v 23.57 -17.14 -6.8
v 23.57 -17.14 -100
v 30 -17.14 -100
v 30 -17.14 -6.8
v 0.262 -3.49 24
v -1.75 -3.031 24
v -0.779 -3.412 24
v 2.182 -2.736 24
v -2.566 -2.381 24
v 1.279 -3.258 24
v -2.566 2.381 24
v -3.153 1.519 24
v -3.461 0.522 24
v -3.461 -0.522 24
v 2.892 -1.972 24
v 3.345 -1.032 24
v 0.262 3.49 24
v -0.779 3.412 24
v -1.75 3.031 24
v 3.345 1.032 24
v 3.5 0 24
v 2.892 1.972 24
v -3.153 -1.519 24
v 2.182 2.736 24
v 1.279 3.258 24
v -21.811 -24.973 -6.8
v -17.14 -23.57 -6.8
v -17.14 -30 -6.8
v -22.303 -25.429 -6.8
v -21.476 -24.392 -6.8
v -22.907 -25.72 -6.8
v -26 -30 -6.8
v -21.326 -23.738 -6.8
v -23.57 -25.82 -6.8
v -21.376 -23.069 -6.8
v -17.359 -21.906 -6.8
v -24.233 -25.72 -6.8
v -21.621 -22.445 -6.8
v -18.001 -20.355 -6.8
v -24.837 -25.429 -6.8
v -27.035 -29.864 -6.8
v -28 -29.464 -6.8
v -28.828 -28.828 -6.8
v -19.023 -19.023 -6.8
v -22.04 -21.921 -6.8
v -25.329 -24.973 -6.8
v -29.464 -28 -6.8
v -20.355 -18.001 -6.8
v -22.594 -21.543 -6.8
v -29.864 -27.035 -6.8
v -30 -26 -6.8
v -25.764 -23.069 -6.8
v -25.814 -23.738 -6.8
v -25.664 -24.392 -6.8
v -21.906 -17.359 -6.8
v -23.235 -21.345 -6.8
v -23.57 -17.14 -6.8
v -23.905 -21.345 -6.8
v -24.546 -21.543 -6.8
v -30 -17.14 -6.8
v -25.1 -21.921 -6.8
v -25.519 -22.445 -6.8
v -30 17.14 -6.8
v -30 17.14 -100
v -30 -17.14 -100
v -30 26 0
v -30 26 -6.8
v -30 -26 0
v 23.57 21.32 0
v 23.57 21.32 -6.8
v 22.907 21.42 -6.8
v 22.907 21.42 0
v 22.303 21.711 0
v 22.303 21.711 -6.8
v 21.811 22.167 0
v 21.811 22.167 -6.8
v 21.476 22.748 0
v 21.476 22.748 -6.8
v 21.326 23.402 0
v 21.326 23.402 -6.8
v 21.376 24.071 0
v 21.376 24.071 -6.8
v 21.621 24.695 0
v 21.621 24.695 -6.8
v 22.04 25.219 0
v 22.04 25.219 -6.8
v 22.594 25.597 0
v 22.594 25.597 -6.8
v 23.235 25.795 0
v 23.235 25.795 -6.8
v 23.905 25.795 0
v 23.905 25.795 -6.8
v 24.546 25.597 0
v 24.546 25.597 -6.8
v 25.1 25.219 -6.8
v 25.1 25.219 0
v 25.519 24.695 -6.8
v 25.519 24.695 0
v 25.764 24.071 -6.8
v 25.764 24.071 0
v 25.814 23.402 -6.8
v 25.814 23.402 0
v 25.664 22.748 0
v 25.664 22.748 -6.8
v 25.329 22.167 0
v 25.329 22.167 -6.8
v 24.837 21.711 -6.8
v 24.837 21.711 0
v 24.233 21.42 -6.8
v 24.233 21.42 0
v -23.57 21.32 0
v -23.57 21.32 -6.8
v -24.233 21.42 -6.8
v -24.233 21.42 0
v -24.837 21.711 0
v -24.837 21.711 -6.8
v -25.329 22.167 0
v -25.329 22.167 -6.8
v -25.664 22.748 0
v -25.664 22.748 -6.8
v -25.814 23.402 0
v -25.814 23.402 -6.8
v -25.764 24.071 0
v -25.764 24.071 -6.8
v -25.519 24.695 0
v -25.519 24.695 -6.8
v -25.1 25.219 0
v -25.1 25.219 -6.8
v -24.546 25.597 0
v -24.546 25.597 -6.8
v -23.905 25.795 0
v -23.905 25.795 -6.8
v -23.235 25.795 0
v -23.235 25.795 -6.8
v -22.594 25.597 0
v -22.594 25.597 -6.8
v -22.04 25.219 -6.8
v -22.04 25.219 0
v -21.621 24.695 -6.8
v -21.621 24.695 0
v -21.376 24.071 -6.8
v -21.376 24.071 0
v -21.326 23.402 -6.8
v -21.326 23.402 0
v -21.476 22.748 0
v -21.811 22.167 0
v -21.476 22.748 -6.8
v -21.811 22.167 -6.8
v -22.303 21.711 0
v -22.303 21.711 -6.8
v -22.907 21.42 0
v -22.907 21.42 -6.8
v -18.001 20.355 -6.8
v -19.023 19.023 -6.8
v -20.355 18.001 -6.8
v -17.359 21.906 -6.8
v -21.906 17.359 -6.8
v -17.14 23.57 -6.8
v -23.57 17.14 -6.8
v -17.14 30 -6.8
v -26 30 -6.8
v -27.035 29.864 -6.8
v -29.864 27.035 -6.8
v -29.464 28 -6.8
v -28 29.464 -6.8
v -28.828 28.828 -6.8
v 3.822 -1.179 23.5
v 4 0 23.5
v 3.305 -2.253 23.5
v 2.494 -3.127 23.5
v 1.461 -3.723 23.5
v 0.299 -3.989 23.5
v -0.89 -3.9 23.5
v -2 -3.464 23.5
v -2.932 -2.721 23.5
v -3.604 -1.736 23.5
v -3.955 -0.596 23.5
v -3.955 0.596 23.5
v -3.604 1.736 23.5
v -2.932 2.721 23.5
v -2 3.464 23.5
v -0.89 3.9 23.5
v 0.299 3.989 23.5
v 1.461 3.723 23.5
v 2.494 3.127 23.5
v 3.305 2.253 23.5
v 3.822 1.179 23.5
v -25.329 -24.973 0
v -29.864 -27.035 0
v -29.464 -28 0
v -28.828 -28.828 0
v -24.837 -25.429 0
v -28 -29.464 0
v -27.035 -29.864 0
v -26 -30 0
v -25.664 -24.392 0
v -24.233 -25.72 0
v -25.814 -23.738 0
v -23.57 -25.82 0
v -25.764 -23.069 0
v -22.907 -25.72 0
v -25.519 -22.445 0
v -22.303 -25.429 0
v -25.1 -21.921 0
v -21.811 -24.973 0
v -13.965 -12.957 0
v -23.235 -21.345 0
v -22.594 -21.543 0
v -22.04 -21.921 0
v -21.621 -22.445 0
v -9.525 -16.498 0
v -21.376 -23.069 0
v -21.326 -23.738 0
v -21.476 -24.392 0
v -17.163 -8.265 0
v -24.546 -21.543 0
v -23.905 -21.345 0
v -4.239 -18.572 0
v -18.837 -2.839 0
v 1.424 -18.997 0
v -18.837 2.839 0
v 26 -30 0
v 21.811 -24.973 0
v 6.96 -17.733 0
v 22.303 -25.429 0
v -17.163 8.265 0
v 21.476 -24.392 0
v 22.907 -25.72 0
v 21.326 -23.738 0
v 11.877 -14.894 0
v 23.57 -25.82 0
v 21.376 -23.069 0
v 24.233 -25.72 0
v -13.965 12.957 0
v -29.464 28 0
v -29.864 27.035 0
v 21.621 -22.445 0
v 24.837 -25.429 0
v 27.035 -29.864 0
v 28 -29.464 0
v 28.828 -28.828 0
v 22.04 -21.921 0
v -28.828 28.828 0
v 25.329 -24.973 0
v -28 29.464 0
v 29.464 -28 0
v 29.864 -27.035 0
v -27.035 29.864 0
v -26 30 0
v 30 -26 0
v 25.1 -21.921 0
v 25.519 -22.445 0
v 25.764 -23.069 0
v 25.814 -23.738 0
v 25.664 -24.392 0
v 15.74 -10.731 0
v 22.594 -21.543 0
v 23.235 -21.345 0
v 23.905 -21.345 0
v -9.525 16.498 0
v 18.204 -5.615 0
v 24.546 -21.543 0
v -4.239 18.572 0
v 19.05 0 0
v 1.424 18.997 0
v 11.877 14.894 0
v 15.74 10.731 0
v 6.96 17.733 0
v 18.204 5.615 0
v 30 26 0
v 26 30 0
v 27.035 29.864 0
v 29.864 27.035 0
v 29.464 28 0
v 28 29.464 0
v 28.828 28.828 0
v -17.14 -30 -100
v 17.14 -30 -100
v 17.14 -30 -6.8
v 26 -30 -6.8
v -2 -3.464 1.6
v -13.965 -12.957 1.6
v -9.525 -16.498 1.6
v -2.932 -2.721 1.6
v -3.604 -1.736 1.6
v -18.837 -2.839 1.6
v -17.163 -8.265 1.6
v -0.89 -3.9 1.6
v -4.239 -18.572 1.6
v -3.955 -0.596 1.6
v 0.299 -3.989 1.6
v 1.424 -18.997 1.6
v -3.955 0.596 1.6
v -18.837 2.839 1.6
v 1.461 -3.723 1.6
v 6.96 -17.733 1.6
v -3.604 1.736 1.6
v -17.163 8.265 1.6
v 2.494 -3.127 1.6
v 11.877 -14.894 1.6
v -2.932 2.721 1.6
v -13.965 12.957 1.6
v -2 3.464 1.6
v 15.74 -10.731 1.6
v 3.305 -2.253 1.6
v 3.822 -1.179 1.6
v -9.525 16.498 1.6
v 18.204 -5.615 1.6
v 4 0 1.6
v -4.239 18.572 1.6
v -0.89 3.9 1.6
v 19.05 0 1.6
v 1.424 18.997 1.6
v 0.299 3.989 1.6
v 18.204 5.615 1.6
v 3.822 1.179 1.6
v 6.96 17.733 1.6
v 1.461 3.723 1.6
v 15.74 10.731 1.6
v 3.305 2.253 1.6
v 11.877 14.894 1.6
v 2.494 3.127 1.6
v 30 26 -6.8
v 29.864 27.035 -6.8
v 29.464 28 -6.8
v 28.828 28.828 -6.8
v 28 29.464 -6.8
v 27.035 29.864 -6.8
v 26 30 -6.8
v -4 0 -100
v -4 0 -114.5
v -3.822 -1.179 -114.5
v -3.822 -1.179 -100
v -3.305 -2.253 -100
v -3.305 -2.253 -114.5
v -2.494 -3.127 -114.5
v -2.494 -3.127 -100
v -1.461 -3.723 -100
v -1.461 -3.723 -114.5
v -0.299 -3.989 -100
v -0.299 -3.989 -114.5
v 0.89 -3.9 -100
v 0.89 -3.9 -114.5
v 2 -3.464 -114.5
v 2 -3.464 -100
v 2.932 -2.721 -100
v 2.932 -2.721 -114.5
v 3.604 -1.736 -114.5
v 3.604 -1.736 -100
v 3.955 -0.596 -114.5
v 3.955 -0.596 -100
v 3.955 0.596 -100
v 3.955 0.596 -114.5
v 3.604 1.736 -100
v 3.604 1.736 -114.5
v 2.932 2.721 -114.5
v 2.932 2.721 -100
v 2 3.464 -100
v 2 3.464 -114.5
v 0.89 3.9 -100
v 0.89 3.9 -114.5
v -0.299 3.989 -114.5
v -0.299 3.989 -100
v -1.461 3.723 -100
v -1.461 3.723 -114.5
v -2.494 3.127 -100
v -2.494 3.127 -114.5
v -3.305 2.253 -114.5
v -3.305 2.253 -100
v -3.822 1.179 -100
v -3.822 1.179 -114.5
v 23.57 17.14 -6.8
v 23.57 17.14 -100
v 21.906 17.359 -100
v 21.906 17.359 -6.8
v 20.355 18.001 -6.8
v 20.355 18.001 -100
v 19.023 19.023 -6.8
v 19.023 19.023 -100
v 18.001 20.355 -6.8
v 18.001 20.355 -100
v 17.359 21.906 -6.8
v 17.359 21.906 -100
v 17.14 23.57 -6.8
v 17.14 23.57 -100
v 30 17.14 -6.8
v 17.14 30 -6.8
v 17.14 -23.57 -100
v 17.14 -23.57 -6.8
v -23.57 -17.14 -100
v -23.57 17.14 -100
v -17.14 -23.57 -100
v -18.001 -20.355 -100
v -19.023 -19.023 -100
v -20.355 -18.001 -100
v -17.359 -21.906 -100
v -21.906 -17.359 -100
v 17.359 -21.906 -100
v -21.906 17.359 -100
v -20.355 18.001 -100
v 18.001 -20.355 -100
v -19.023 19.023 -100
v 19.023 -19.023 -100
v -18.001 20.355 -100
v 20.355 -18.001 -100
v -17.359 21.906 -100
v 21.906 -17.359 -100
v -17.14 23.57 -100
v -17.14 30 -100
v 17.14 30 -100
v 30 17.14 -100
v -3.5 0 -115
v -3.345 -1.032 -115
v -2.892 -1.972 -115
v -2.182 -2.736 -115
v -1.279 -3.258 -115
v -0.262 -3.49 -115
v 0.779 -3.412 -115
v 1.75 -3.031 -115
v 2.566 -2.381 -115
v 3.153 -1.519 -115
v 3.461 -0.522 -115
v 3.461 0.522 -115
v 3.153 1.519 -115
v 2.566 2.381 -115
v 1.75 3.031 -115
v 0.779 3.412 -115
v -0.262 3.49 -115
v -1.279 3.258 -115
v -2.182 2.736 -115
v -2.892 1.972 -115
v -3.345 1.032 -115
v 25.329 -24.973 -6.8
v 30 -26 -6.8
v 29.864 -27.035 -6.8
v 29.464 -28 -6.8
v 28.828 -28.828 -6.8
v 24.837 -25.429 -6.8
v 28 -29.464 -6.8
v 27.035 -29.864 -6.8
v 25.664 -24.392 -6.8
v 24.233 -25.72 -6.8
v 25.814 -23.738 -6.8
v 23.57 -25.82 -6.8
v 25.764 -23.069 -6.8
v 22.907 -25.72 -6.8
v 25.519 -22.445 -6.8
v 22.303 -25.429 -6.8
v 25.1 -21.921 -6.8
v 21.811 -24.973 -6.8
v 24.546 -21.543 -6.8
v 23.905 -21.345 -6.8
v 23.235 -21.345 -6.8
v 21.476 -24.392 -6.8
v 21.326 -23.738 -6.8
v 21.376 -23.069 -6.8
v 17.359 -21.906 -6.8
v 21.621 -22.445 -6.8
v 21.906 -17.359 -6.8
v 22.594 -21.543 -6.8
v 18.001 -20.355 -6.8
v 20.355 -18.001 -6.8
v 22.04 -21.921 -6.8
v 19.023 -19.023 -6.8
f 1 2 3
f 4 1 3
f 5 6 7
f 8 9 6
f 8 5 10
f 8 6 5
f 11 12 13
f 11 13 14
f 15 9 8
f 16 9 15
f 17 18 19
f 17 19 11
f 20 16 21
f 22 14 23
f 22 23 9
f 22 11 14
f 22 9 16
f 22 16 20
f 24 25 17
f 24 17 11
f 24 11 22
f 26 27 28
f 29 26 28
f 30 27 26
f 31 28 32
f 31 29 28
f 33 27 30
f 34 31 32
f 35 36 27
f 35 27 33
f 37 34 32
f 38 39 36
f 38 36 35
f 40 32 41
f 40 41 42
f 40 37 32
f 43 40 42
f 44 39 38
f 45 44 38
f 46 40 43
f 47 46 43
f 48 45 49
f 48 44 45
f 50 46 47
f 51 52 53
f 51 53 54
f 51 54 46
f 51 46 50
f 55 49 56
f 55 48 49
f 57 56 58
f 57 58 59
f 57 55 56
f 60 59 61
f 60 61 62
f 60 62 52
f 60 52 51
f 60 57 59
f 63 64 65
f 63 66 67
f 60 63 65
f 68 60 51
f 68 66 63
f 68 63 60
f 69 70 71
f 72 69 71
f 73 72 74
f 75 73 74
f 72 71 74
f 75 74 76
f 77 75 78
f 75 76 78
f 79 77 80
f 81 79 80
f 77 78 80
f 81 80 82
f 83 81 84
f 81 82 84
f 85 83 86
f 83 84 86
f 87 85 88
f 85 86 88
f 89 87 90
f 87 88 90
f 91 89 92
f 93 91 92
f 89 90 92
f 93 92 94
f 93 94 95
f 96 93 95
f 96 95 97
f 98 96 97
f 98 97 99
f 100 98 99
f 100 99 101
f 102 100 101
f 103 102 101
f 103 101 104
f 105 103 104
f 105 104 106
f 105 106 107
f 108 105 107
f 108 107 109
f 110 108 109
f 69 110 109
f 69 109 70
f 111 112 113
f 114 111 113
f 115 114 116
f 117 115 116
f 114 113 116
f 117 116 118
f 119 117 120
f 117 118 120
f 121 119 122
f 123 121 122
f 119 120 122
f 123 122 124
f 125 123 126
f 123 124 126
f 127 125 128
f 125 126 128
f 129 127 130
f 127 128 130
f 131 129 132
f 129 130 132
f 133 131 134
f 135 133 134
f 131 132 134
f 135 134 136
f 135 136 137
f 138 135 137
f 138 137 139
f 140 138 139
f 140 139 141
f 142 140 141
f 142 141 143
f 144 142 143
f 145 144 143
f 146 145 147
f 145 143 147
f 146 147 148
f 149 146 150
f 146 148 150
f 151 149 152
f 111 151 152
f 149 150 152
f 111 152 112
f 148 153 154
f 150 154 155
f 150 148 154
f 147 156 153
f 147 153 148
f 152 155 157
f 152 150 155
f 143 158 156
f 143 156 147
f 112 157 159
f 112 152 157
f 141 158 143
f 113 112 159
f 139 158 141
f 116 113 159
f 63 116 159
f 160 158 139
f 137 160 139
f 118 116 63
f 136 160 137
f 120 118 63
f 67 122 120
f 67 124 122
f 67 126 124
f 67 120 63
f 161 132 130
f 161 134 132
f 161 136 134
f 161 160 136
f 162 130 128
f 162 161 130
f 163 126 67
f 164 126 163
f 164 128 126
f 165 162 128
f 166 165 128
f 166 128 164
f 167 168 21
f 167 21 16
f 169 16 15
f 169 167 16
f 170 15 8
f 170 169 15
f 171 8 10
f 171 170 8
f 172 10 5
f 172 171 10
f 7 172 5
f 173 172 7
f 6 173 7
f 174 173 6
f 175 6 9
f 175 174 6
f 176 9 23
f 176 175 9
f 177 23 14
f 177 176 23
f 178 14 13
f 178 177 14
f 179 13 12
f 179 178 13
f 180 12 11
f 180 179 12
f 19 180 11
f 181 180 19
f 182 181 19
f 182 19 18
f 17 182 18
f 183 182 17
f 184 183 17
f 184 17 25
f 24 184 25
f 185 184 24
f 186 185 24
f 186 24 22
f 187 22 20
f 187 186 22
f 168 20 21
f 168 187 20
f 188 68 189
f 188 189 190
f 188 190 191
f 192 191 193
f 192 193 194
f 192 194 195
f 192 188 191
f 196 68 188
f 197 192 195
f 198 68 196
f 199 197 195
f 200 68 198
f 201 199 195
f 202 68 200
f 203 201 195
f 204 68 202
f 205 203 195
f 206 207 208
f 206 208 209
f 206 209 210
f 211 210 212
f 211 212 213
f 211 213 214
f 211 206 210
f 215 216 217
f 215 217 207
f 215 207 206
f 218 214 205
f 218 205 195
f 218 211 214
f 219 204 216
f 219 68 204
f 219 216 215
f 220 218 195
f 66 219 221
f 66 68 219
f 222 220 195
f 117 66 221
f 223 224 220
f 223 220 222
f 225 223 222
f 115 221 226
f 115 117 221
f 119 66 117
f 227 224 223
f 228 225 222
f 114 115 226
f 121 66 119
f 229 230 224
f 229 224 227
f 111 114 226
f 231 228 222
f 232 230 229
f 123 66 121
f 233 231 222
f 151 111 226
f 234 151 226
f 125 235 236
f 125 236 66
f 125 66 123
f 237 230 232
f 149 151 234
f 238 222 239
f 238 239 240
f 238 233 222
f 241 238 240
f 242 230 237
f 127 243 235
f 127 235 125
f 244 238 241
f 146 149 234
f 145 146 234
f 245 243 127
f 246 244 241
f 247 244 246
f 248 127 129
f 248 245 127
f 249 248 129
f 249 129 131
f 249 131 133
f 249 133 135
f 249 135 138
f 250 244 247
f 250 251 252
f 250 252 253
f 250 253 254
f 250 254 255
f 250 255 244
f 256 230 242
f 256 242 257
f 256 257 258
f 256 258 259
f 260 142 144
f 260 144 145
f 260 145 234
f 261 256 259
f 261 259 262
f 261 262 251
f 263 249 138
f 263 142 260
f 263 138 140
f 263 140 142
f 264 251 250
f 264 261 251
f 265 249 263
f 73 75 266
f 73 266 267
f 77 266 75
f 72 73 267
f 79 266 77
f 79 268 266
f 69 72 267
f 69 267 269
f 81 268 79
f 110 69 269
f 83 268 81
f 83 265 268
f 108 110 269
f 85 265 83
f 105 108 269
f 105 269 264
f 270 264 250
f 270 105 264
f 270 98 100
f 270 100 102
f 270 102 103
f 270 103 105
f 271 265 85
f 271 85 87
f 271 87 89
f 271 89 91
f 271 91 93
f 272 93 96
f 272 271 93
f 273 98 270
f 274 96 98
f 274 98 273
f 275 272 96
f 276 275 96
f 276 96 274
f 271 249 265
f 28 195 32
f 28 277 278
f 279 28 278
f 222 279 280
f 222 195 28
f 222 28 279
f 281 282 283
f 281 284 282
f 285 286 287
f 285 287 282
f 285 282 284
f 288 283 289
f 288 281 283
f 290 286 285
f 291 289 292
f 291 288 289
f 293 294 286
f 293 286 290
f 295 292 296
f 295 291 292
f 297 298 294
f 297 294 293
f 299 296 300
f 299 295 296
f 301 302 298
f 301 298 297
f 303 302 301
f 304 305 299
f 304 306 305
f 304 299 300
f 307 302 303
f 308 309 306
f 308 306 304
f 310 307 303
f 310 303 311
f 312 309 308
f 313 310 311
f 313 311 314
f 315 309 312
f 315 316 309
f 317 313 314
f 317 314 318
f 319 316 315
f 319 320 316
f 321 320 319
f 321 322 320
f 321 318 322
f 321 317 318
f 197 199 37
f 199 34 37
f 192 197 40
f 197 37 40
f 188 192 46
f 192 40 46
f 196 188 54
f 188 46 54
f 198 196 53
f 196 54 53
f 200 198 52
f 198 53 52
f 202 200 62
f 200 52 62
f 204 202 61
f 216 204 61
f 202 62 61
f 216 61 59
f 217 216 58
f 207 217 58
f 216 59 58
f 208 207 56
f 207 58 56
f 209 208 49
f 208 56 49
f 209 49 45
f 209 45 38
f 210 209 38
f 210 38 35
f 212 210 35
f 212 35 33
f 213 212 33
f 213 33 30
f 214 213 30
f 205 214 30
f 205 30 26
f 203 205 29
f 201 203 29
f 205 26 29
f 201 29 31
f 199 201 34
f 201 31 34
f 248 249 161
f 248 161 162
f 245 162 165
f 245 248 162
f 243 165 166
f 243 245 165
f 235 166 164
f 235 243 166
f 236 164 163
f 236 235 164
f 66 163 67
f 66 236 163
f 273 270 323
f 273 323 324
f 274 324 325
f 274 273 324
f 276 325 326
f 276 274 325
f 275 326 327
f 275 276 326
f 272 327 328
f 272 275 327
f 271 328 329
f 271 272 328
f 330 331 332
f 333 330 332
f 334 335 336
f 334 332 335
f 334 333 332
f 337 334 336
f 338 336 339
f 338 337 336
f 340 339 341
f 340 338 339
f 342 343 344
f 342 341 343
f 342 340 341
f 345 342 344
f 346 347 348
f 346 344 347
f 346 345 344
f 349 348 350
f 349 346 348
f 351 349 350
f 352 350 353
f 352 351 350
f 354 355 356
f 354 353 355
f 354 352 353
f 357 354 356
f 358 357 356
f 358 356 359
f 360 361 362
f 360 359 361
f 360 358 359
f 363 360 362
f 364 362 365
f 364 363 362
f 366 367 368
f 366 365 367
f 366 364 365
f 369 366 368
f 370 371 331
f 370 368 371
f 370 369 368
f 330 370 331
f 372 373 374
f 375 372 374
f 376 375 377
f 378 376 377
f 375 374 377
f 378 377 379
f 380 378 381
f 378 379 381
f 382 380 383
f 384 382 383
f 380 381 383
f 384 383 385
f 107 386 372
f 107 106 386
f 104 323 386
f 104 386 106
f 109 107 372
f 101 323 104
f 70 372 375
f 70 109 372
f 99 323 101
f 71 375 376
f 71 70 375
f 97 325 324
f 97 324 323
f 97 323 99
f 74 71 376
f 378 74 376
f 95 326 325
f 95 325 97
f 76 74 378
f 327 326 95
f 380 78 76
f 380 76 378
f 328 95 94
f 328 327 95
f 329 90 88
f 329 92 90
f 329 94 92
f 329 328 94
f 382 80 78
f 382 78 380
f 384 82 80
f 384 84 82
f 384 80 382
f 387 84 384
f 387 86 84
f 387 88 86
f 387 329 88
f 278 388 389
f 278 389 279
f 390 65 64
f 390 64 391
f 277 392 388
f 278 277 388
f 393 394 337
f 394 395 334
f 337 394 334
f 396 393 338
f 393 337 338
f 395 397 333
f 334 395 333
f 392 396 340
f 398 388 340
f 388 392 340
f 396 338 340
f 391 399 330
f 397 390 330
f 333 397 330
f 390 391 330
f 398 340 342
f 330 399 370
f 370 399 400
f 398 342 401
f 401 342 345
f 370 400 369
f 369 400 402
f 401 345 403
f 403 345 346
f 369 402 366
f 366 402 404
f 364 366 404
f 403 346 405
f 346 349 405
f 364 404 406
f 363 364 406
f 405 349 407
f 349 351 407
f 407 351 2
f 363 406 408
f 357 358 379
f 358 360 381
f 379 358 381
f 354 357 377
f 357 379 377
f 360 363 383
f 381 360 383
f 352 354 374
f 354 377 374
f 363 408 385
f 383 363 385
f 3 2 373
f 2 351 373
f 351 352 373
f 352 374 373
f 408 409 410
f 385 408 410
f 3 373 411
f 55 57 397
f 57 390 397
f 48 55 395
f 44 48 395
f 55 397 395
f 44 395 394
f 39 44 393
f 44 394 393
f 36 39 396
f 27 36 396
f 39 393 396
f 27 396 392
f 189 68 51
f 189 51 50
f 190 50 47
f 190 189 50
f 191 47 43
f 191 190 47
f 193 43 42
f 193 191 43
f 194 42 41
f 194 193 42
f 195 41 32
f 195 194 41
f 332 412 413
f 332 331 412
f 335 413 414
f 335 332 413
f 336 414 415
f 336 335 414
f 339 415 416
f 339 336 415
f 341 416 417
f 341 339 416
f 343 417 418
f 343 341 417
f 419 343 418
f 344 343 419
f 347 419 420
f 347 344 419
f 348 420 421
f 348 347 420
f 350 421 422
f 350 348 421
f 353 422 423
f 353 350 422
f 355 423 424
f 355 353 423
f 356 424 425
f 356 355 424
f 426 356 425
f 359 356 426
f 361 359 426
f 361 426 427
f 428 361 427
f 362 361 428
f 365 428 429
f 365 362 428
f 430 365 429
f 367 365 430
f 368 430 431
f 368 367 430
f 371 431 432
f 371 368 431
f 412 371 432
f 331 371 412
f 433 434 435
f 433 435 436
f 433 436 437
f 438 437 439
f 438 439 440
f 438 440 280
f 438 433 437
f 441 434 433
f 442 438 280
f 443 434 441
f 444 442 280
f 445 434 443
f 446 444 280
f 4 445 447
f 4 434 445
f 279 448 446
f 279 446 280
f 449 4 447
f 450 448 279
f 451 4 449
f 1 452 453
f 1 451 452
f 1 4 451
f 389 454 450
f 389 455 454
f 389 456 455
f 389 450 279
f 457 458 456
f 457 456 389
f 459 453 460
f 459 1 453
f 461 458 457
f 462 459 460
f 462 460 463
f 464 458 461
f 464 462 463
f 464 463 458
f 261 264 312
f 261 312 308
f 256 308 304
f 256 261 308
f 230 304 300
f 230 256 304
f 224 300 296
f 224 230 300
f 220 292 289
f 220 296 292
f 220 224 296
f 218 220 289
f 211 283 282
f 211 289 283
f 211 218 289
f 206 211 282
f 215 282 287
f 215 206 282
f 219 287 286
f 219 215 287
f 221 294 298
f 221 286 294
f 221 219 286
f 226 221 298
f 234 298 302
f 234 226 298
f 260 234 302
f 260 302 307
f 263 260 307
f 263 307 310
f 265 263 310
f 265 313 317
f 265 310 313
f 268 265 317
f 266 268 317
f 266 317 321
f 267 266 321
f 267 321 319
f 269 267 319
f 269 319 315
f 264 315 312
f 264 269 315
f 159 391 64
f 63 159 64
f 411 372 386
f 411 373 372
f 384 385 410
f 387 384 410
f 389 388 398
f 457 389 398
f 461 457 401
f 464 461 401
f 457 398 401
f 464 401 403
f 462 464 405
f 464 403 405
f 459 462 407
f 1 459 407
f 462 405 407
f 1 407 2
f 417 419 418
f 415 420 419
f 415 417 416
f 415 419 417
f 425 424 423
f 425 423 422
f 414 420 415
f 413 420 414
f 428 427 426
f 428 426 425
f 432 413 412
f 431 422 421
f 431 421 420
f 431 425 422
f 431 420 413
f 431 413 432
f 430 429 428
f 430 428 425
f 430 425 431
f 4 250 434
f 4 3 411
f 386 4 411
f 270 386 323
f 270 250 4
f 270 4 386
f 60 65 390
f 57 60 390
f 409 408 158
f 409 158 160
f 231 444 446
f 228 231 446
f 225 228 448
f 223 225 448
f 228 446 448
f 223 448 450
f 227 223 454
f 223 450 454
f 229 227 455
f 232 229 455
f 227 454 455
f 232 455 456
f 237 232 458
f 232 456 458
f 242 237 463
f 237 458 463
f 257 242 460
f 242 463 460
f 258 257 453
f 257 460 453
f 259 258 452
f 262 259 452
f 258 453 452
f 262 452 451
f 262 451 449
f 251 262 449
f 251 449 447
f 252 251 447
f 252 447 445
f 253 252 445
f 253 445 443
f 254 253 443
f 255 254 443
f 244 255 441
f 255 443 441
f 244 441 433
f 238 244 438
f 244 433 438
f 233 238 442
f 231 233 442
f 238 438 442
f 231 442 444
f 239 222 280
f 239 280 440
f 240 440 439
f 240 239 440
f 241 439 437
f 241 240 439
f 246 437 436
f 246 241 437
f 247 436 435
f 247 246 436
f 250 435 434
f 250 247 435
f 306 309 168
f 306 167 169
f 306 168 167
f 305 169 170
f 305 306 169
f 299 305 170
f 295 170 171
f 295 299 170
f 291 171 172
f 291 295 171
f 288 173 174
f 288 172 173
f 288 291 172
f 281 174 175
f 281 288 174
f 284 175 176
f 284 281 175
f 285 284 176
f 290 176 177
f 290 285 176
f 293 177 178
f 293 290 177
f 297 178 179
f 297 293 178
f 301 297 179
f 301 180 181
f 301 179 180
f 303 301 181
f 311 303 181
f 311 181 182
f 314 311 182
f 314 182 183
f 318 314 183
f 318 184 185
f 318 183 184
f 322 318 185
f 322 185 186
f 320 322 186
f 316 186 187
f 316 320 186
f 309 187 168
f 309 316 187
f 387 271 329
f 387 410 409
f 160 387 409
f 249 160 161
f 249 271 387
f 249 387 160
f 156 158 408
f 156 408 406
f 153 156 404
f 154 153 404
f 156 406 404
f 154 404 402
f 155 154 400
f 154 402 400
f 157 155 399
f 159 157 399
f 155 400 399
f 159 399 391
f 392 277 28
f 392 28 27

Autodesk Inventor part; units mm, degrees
ref_plane "YZ Plane" through (0, 0, 0) normal (1, 0, 0) x (0, 1, 0)
ref_plane "XZ Plane" through (0, 0, 0) normal (0, 1, 0) x (-1, 0, 0)
ref_plane "XY Plane" through (0, 0, 0) normal (0, 0, 1) x (1, 0, 0)
sketch "Skizze1" plane through (0, 0, 0) normal (0, 0, 1) x (1, 0, 0)
  line L0 (-26, -30) -> (26, -30)
  line L1 (30, -26) -> (30, 26)
  line L2 (26, 30) -> (-26, 30)
  line L3 (-30, 26) -> (-30, -26)
  line L4 (-30, -30) -> (30, 30) construction
  line L5 (30, -30) -> (-30, 30) construction
  arc A0 (30, 26) -> (26, 30) centre (26, 26) ccw
  arc A1 (26, -30) -> (30, -26) centre (26, -26) ccw
  arc A2 (-30, -26) -> (-26, -30) centre (-26, -26) ccw
  arc A3 (-26, 30) -> (-30, 26) centre (-26, 26) ccw
  point P0 (0, 0)
  dimension "d0" = 4
  dimension "d1" = 60
extrude "Extrusion1" add sketch "Skizze1" against normal blind 100
sketch "Skizze2" plane through (0, 0, 0) normal (0, 0, 1) x (1, 0, 0)
  circle A0 centre (0, 0) radius 19.05
  dimension "d4" = 38.1
extrude "Extrusion2" add sketch "Skizze2" along normal blind 1.6
sketch "Skizze4" plane through (0, 0, 0) normal (0, 0, 1) x (1, 0, 0)
  circle A0 centre (0, 0) radius 19.05 projected
  line L0 (30, 26) -> (30, -26) projected
  arc A1 (30, 26) -> (26, 30) centre (26, 26) ccw projected
  line L1 (-26, 30) -> (26, 30) projected
  arc A2 (-26, 30) -> (-30, 26) centre (-26, 26) ccw projected
  line L2 (-30, -26) -> (-30, 26) projected
  arc A3 (-30, -26) -> (-26, -30) centre (-26, -26) ccw projected
  line L3 (26, -30) -> (-26, -30) projected
  arc A4 (26, -30) -> (30, -26) centre (26, -26) ccw projected
  line L4 (26, -26) -> (-26, 26) construction
  line L5 (-23.57, 23.57) -> (23.57, 23.57) construction
  line L6 (23.57, 23.57) -> (23.57, -23.57) construction
  line L7 (23.57, -23.57) -> (-23.57, -23.57) construction
  line L8 (-23.57, -23.57) -> (-23.57, 23.57) construction
  line L9 (-23.57, 23.57) -> (23.57, -23.57) construction
  line L10 (23.57, 23.57) -> (-23.57, -23.57) construction
  dimension "d15" = 47.14
hole "Bohrung1" at (23.57, 23.57, 0) at (-23.57, 23.57, 0) at (-23.57, -23.57, 0) at (23.57, -23.57, 0) direction (0, 0, -1) diameter 4.5 end through all
sketch "Skizze5" plane through (0, 0, 1.6) normal (0, 0, 1) x (1, 0, 0)
  circle A0 centre (0, 0) radius 4
  dimension "d23" = 8
extrude "Extrusion4" add sketch "Skizze5" along normal blind 22.4
sketch "Skizze7" plane through (0, 0, -100) normal (0, 0, -1) x (-1, 0, 0)
  circle A0 centre (23.57, -23.57) radius 2.25 projected
  circle A1 centre (-23.57, 23.57) radius 2.25 projected
  circle A2 centre (23.57, 23.57) radius 2.25 projected
  circle A3 centre (-23.57, -23.57) radius 2.25 projected
  line L0 (-30, 26) -> (-30, -26) projected
  arc A4 (-30, -26) -> (-26, -30) centre (-26, -26) ccw projected
  line L1 (-26, -30) -> (26, -30) projected
  arc A5 (26, -30) -> (30, -26) centre (26, -26) ccw projected
  line L2 (30, -26) -> (30, 26) projected
  arc A6 (30, 26) -> (26, 30) centre (26, 26) ccw projected
  line L3 (26, 30) -> (-26, 30) projected
  arc A7 (-26, 30) -> (-30, 26) centre (-26, 26) ccw projected
  circle A8 centre (23.57, -23.57) radius 6.43 construction
  line L4 (30, -26) -> (30, 26) projected
  line L5 (30, -17.14) -> (23.57, -17.14)
  line L6 (-26, -30) -> (26, -30) projected
  line L7 (17.14, -30) -> (17.14, -23.57)
  arc A9 (23.57, -17.14) -> (17.14, -23.57) centre (23.57, -23.57) ccw
  arc A10 (-17.14, -23.57) -> (-23.57, -17.14) centre (-23.57, -23.57) ccw
  arc A11 (17.2019, 24.4599) -> (23.57, 17.14) centre (23.57, 23.57) ccw
  arc A12 (-23.57, 17.14) -> (-17.14, 23.57) centre (-23.57, 23.57) ccw
  line L8 (23.57, 17.14) -> (30, 17.14)
  line L9 (17.14, 23.57) -> (17.14, 30)
  line L10 (26, 30) -> (-26, 30) projected
  line L11 (-17.14, 23.57) -> (-17.14, 30)
  line L12 (-23.57, 17.14) -> (-30, 17.14)
  line L13 (-23.57, -17.14) -> (-30, -17.14)
  line L14 (-17.14, -23.57) -> (-17.14, -30)
  point P0 (0, 0)
extrude "Extrusion6" cut sketch "Skizze7" against normal blind 93.2 contours A7 L3 L11 A12 L12 L0 | L13 A10 L14 L1 A4 L0 | L3 A6 L2 L8 A11 L9 | L7 A9 L5 L2 A5 L1
sketch "Skizze8" plane through (0, 0, -100) normal (0, 0, -1) x (-1, 0, 0)
  circle A0 centre (23.57, -23.57) radius 2.25 construction
  circle A1 centre (-23.57, 23.57) radius 2.25 construction
  circle A2 centre (23.57, 23.57) radius 2.25 construction
  circle A3 centre (-23.57, -23.57) radius 2.25 construction
  circle A4 centre (0, 0) radius 19.05 construction
  line L0 (-30, 26) -> (-30, -26) construction
  arc A5 (-26, 30) -> (-30, 26) centre (-26, 26) ccw construction
  line L1 (26, 30) -> (-26, 30) construction
  arc A6 (30, 26) -> (26, 30) centre (26, 26) ccw construction
  line L2 (30, -26) -> (30, 26) construction
  arc A7 (26, -30) -> (30, -26) centre (26, -26) ccw construction
  line L3 (-26, -30) -> (26, -30) construction
  arc A8 (-30, -26) -> (-26, -30) centre (-26, -26) ccw construction
  circle A9 centre (0, 0) radius 42.4264 construction
  line L4 (30, 30) -> (-30, 30) construction
  line L5 (-30, 30) -> (-30, -30) construction
  line L6 (-30, -30) -> (30, -30) construction
  line L7 (30, -30) -> (30, 30) construction
  line L8 (30, 30) -> (-30, -30) construction
  line L9 (-30, 30) -> (30, -30) construction
  line L10 (-17.14, -30) -> (17.14, -30) construction
  line L11 (-30, 17.14) -> (-30, -17.14) construction
sketch "Skizze9" plane through (0, 0, -100) normal (0, 0, -1) x (-1, 0, 0)
  circle A0 centre (0, 0) radius 4 projected
extrude "Extrusion7" add sketch "Skizze9" along normal blind 15
chamfer "Fase1" distance 0.5 angle 45 2 edges at (4, 0, -115) (-4, 0, 24)
equation "\"d1\" = breite"
equation "\"d2\" = Laenge"
equation "\"d4\" = fit"
equation "\"d5\" = fit_l"
equation "\"d15\" = lochabstand"
equation "\"d16\" = bohrung_d"
equation "\"d23\" = schaft_d"
equation "\"d24\" = schaft_l"
equation "\"d28\" = Laenge - Mount_l"
equation "\"breite\" = 60"
equation "\"lochabstand\" = 47.14"
equation "\"schaft_d\" = 8"
equation "\"fit\" = 38.1"
equation "\"fit_l\" = 1.6"
equation "\"Mount_l\" = 6.8"
equation "\"Laenge\" = 100"
equation "\"bohrung_d\" = 4.5"
equation "\"schaft_l\" = 22.4"
properties part number "Nema24 - L100" material "Stahl"
